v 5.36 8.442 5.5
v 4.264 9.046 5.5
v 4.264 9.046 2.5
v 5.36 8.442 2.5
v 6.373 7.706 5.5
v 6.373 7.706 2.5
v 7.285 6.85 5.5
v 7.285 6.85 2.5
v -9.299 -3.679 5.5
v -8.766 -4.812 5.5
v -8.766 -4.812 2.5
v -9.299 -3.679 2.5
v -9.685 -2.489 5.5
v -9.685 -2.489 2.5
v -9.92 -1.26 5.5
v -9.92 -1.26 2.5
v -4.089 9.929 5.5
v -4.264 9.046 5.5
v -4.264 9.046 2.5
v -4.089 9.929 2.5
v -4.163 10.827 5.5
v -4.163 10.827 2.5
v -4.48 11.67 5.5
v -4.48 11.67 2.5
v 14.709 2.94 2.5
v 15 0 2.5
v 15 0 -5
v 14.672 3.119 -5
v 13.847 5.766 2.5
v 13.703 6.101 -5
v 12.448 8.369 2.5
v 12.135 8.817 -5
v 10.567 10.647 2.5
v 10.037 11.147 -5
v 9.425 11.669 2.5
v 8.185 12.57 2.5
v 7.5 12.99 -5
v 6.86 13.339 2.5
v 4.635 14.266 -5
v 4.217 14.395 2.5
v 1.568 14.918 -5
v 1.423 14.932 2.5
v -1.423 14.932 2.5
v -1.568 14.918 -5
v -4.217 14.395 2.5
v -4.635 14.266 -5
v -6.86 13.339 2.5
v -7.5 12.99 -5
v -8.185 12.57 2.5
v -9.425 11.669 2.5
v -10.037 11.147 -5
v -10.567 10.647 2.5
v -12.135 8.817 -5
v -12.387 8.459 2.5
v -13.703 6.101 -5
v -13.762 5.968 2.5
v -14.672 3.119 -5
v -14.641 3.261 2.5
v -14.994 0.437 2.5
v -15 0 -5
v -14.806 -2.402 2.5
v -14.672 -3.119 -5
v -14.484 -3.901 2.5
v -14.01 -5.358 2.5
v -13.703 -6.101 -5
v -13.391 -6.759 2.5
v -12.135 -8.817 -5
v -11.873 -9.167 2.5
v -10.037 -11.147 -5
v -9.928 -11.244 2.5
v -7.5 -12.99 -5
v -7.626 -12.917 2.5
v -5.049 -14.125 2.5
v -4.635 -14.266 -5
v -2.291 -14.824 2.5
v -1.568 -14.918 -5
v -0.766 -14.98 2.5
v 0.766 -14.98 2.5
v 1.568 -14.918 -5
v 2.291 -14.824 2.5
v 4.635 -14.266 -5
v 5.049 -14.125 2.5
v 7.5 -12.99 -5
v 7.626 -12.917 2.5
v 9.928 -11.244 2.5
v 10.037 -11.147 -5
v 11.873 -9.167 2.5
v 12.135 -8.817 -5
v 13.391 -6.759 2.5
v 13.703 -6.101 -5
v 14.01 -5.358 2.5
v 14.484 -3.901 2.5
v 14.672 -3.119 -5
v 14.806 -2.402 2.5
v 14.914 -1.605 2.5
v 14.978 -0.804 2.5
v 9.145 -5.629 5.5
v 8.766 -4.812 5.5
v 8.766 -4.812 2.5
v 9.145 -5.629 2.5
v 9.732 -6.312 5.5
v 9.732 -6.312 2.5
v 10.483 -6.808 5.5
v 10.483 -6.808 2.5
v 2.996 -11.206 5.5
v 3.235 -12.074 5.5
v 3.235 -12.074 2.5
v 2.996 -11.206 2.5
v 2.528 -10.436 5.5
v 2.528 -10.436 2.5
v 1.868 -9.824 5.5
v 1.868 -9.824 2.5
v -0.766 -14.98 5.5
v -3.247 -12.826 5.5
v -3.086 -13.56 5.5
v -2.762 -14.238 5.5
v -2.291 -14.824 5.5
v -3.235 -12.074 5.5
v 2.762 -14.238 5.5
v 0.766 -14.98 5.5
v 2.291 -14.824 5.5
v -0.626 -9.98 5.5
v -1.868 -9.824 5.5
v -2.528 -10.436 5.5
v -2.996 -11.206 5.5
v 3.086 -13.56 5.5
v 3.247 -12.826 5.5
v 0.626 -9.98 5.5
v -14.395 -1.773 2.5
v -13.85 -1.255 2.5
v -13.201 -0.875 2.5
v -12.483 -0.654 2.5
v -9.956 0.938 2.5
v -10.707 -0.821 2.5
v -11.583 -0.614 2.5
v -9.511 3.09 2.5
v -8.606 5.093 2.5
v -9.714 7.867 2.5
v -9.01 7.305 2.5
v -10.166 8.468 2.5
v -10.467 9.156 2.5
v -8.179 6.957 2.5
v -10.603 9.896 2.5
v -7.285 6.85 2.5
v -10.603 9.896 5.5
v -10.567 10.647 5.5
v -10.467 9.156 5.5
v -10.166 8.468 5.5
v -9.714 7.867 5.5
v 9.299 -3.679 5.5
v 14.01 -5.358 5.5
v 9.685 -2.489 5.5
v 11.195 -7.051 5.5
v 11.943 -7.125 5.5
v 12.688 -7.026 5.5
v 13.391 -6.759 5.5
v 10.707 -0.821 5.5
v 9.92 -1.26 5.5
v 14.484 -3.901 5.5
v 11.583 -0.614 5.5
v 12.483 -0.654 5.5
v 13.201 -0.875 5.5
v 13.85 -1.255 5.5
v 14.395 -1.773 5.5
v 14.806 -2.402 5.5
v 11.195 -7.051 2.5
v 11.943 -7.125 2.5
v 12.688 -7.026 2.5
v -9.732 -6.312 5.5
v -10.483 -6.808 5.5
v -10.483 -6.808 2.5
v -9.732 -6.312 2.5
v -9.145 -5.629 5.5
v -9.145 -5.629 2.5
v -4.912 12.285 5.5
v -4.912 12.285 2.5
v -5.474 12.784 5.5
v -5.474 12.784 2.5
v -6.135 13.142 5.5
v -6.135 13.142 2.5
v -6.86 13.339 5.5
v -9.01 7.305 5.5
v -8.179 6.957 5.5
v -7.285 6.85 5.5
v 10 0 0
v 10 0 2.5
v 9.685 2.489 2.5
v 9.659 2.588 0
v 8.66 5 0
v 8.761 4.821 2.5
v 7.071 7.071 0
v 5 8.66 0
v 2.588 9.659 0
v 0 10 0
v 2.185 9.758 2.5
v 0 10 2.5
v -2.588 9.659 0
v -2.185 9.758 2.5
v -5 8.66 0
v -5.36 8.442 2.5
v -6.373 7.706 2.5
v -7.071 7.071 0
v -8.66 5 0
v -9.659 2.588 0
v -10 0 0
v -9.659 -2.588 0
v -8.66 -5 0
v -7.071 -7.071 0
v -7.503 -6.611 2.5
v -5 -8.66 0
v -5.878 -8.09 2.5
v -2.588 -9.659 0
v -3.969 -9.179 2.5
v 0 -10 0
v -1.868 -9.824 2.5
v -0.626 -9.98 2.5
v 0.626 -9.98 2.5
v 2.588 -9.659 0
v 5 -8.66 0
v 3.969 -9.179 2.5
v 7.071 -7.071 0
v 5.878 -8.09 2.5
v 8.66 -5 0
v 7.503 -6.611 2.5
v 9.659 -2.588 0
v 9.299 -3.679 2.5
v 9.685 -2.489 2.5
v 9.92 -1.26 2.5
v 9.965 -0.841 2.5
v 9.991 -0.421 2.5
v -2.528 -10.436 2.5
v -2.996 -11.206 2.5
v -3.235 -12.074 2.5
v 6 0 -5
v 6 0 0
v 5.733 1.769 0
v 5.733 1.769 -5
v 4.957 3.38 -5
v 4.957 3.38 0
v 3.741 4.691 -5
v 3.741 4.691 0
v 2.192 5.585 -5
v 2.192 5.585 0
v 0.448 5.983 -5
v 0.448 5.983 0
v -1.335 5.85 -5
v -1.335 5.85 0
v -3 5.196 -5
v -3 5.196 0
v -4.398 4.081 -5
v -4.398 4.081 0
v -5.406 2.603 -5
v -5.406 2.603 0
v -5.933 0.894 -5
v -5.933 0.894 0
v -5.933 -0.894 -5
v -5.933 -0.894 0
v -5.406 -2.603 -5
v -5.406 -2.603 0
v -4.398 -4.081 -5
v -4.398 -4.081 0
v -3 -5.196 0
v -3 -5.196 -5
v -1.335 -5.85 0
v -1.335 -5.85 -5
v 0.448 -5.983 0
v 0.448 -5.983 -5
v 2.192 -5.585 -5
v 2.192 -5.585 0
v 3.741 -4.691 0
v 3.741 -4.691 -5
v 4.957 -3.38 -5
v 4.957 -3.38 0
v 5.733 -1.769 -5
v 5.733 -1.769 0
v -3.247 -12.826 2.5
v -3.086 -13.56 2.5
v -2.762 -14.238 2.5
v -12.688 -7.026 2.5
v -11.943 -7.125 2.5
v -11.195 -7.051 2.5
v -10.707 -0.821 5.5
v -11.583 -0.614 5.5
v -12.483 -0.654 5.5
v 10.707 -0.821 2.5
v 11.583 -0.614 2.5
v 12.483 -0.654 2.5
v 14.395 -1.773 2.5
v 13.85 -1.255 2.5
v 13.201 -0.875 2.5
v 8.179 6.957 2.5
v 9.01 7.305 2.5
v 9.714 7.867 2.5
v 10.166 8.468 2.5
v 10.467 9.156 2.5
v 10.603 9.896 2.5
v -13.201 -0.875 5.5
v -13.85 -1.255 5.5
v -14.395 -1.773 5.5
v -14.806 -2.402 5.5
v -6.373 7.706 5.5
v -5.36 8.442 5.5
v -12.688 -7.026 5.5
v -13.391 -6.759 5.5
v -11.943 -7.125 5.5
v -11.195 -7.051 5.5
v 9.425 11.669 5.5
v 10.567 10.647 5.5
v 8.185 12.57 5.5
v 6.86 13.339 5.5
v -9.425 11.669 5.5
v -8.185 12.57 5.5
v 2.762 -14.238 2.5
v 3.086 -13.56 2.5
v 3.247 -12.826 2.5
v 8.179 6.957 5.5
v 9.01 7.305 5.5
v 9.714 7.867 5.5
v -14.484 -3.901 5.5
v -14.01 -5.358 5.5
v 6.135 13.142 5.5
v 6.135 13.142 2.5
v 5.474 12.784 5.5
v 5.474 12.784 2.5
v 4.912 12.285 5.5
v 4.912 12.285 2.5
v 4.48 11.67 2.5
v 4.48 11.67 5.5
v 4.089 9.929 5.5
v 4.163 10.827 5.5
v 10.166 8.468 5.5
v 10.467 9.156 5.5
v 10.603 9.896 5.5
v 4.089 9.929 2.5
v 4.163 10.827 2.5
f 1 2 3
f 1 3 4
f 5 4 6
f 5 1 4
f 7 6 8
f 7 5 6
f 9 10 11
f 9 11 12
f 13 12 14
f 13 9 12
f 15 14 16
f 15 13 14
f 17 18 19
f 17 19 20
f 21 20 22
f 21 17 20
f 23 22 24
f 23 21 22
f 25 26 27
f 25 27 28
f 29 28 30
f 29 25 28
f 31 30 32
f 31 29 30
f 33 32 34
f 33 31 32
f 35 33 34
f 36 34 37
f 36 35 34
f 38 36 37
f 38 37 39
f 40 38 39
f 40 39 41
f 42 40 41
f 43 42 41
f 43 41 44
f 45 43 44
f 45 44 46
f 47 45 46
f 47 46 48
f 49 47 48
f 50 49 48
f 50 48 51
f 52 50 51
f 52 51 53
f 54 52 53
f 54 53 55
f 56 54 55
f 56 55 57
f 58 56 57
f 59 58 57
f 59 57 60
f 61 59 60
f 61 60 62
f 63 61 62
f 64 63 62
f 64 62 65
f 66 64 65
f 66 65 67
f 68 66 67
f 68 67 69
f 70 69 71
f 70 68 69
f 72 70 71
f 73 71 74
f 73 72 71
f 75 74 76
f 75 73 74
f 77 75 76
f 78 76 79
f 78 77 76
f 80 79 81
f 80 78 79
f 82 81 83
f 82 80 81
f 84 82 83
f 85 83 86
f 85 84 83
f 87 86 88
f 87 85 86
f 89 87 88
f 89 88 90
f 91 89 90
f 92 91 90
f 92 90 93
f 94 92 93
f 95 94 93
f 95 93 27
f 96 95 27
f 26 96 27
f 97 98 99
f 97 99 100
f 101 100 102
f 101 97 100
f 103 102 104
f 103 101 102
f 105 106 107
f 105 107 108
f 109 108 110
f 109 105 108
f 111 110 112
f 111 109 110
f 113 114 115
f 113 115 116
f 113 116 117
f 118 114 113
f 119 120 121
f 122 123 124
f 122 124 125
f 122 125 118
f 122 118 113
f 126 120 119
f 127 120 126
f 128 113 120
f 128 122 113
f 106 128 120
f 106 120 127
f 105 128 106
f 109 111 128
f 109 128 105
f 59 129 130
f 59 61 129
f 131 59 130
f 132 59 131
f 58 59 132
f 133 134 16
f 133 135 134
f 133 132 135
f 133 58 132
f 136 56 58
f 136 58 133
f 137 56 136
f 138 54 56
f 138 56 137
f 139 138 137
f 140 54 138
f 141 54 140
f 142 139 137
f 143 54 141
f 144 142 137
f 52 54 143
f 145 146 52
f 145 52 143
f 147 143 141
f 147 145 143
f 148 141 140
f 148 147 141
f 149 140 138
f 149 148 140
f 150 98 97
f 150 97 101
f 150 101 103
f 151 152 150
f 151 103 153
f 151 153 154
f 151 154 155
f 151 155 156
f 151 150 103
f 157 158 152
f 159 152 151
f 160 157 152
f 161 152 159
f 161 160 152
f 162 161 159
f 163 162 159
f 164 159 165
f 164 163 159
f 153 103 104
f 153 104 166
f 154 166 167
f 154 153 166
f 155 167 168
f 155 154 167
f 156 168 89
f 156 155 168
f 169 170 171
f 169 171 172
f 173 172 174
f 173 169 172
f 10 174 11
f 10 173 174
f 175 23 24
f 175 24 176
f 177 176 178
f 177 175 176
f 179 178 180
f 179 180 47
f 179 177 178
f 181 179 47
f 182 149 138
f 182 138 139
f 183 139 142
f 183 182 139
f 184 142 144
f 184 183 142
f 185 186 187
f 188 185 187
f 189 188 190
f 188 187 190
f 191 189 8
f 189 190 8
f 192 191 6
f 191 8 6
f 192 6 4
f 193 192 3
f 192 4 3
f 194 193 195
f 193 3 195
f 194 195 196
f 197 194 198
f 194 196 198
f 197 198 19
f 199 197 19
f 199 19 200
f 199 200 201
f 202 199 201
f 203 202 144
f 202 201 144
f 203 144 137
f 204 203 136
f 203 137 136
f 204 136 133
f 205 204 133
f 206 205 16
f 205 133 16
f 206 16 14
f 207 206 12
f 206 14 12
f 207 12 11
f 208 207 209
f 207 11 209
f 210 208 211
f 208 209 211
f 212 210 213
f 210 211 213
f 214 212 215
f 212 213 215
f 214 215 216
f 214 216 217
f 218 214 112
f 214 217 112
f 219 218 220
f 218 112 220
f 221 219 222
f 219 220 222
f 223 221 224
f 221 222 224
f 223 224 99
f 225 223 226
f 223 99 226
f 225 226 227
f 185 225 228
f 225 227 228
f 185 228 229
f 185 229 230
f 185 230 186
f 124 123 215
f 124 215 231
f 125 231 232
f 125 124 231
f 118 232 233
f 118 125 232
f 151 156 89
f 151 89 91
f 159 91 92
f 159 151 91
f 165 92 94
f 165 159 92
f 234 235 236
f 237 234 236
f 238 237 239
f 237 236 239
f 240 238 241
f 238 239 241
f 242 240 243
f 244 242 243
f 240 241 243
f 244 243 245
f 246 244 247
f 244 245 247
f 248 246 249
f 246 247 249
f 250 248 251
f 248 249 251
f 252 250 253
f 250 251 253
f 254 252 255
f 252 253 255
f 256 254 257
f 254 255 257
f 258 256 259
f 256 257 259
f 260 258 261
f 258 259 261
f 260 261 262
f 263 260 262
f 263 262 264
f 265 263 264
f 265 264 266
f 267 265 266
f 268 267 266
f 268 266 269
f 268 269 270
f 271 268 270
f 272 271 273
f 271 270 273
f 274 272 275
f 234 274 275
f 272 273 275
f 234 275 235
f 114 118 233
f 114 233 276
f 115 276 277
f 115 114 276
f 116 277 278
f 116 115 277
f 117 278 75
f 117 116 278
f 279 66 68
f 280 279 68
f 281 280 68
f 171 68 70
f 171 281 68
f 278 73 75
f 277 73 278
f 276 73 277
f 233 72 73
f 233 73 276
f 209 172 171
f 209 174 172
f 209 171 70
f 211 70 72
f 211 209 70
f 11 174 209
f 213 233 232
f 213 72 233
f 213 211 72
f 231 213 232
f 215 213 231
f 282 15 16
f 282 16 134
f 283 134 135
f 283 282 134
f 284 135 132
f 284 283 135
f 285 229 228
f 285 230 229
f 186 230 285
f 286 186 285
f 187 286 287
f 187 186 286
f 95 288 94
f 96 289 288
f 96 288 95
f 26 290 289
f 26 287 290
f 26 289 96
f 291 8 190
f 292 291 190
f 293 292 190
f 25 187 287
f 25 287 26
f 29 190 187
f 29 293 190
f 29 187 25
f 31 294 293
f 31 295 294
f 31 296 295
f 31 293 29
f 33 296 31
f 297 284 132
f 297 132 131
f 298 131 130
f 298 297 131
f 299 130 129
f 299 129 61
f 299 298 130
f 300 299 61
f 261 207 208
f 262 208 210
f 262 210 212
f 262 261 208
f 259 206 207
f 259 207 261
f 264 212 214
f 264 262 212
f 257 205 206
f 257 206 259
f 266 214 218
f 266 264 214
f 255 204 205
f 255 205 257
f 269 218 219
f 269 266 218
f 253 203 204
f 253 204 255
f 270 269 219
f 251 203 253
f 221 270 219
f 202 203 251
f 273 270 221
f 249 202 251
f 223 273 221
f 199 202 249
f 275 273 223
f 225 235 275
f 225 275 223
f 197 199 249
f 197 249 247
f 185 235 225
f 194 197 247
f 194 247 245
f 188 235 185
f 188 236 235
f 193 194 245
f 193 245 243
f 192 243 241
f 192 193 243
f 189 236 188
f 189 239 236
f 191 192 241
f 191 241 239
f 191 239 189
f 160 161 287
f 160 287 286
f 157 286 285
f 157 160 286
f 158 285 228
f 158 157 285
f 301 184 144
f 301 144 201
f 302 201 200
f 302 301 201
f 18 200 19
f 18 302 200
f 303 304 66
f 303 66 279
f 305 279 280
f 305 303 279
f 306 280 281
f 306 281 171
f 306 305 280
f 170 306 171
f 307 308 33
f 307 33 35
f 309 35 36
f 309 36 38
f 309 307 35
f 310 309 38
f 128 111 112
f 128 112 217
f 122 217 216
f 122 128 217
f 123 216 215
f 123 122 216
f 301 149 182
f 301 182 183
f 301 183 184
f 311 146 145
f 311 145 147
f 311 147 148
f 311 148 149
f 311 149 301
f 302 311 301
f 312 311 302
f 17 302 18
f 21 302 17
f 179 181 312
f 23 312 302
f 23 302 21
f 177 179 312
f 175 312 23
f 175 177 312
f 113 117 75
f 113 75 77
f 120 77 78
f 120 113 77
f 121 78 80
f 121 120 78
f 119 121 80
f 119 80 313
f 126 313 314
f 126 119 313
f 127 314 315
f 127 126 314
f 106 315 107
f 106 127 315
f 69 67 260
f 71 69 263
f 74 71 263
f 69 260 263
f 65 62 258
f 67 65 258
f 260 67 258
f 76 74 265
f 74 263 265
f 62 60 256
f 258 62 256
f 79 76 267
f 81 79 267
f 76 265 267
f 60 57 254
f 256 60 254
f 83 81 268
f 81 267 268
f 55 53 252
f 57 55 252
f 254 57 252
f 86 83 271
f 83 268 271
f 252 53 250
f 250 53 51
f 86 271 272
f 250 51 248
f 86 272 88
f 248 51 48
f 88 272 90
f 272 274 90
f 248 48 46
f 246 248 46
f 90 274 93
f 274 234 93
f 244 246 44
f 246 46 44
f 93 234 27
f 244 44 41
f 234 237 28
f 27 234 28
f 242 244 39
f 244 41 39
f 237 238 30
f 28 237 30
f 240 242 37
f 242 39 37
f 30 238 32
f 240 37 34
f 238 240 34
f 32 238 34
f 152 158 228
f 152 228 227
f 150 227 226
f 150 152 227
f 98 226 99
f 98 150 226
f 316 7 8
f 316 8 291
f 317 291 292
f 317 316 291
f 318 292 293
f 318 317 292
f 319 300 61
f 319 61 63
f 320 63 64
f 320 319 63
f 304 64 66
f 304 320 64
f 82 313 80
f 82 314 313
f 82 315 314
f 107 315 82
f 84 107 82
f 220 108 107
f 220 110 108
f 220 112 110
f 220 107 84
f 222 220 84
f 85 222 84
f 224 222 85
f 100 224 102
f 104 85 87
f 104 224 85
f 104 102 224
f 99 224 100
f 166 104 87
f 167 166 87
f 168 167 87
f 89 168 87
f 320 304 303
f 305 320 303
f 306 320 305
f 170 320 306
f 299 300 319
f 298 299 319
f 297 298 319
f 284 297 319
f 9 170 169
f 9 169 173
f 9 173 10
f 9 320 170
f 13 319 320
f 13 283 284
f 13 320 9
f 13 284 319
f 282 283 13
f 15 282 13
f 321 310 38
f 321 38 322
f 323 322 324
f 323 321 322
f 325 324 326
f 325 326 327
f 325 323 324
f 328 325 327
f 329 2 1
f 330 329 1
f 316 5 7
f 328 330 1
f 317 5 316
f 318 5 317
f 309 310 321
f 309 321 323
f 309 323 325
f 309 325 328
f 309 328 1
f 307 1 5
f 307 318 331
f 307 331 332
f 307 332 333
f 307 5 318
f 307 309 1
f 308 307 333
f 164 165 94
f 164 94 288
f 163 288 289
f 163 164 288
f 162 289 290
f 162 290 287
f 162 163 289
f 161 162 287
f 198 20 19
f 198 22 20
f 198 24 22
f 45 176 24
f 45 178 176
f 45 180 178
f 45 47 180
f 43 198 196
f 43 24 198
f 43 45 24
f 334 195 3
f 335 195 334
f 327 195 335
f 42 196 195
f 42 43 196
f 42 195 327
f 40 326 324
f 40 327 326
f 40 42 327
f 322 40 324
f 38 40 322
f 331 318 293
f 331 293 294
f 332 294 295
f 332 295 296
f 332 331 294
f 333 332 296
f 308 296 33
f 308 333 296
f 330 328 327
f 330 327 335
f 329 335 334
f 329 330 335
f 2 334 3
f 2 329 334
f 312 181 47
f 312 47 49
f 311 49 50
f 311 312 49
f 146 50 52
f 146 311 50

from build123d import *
from build123d.topology import SkipClean

# Parameters (mm, degrees)
SKETCH1_R           = 15
SKETCH1_R_2         = 10
SKETCH1_R_3         = 6
BOSS_EXTRUDE1_DEPTH = 5
BOSS_EXTRUDE2_START = 2.5
SKETCH2_R           = 15
SKETCH2_R_2         = 10
BOSS_EXTRUDE2_DEPTH = 2.5
BOSS_EXTRUDE4_START = 3
BOSS_EXTRUDE4_DEPTH = 3


with BuildPart() as part:
    # Sketch1 → Boss-Extrude1 (new body)
    # profile 1 of 2: a face of its own
    with BuildSketch(Plane.XY):
        Circle(SKETCH1_R)
        Circle(SKETCH1_R_2, mode=Mode.SUBTRACT)
    # profile 2 of 2: a face of its own
    with BuildSketch(Plane.XY):
        Circle(SKETCH1_R_2)
        Circle(SKETCH1_R_3, mode=Mode.SUBTRACT)
    extrude(amount=-BOSS_EXTRUDE1_DEPTH)

    # Sketch2 → Boss-Extrude2 (add)
    with BuildSketch(Plane.XY.offset(BOSS_EXTRUDE2_START)):
        Circle(SKETCH2_R)
        Circle(SKETCH2_R_2, mode=Mode.SUBTRACT)
    extrude(amount=-BOSS_EXTRUDE2_DEPTH)

    # Sketch3 → Boss-Extrude4 (add)
    with SkipClean():  # the faces are left unmerged after this step: merging them gives an invalid solid
        with BuildSketch(Plane.XY.offset(2.5).offset(BOSS_EXTRUDE4_START)):
            with BuildLine():
                ThreePointArc((-2.290603582, -14.824072829), (0, -15), (2.290603582, -14.824072829))
                ThreePointArc((2.290603582, -14.824072829), (3.086155614, -13.560105094), (3.235238064, -12.074072829))
                ThreePointArc((3.235238064, -12.074072829), (2.788392741, -10.80499404), (1.867509855, -9.824072829))
                ThreePointArc((1.867509855, -9.824072829), (0, -10), (-1.867509855, -9.824072829))
                ThreePointArc((-1.867509855, -9.824072829), (-2.788392741, -10.80499404), (-3.235238064, -12.074072829))
                ThreePointArc((-3.235238064, -12.074072829), (-3.086155614, -13.560105094), (-2.290603582, -14.824072829))
            make_face()
            with BuildLine():
                ThreePointArc((-14.806366496, -2.402396967), (-14.265847744, -4.635254916), (-13.390695627, -6.759383893))
                ThreePointArc((-13.390695627, -6.759383893), (-11.942751779, -7.125411327), (-10.483382099, -6.807987938))
                ThreePointArc((-10.483382099, -6.807987938), (-9.414499246, -5.990845869), (-8.766156198, -4.811912875))
                ThreePointArc((-8.766156198, -4.811912875), (-9.510565163, -3.090169944), (-9.920340763, -1.259698041))
                ThreePointArc((-9.920340763, -1.259698041), (-11.137820734, -0.687007696), (-12.482869184, -0.654199453))
                ThreePointArc((-12.482869184, -0.654199453), (-13.850100843, -1.255194512), (-14.806366496, -2.402396967))
            make_face()
            with BuildLine():
                ThreePointArc((-6.860234162, 13.339309849), (-8.816778784, 12.135254916), (-10.566508613, 10.64654384))
                ThreePointArc((-10.566508613, 10.64654384), (-10.467182133, 9.15635871), (-9.714324518, 7.866504888))
                ThreePointArc((-9.714324518, 7.866504888), (-8.606873263, 7.102447672), (-7.285292336, 6.850147121))
                ThreePointArc((-7.285292336, 6.850147121), (-5.877852523, 8.090169944), (-4.263597916, 9.045536624))
                ThreePointArc((-4.263597916, 9.045536624), (-4.095159033, 10.380399934), (-4.479599369, 11.669755331))
                ThreePointArc((-4.479599369, 11.669755331), (-5.473677455, 12.784352223), (-6.860234162, 13.339309849))
            make_face()
            with BuildLine():
                ThreePointArc((10.566508613, 10.64654384), (8.816778784, 12.135254916), (6.860234162, 13.339309849))
                ThreePointArc((6.860234162, 13.339309849), (5.473677455, 12.784352223), (4.479599369, 11.669755331))
                ThreePointArc((4.479599369, 11.669755331), (4.095159033, 10.380399934), (4.263597916, 9.045536624))
                ThreePointArc((4.263597916, 9.045536624), (5.877852523, 8.090169944), (7.285292336, 6.850147121))
                ThreePointArc((7.285292336, 6.850147121), (8.606873263, 7.102447672), (9.714324518, 7.866504888))
                ThreePointArc((9.714324518, 7.866504888), (10.467182133, 9.15635871), (10.566508613, 10.64654384))
            make_face()
            with BuildLine():
                ThreePointArc((13.390695627, -6.759383893), (14.265847744, -4.635254916), (14.806366496, -2.402396967))
                ThreePointArc((14.806366496, -2.402396967), (13.850100843, -1.255194512), (12.482869184, -0.654199453))
                ThreePointArc((12.482869184, -0.654199453), (11.137820734, -0.687007696), (9.920340763, -1.259698041))
                ThreePointArc((9.920340763, -1.259698041), (9.510565163, -3.090169944), (8.766156198, -4.811912875))
                ThreePointArc((8.766156198, -4.811912875), (9.414499246, -5.990845869), (10.483382099, -6.807987938))
                ThreePointArc((10.483382099, -6.807987938), (11.942751779, -7.125411327), (13.390695627, -6.759383893))
            make_face()
        extrude(amount=-BOSS_EXTRUDE4_DEPTH)


solid = part.part
